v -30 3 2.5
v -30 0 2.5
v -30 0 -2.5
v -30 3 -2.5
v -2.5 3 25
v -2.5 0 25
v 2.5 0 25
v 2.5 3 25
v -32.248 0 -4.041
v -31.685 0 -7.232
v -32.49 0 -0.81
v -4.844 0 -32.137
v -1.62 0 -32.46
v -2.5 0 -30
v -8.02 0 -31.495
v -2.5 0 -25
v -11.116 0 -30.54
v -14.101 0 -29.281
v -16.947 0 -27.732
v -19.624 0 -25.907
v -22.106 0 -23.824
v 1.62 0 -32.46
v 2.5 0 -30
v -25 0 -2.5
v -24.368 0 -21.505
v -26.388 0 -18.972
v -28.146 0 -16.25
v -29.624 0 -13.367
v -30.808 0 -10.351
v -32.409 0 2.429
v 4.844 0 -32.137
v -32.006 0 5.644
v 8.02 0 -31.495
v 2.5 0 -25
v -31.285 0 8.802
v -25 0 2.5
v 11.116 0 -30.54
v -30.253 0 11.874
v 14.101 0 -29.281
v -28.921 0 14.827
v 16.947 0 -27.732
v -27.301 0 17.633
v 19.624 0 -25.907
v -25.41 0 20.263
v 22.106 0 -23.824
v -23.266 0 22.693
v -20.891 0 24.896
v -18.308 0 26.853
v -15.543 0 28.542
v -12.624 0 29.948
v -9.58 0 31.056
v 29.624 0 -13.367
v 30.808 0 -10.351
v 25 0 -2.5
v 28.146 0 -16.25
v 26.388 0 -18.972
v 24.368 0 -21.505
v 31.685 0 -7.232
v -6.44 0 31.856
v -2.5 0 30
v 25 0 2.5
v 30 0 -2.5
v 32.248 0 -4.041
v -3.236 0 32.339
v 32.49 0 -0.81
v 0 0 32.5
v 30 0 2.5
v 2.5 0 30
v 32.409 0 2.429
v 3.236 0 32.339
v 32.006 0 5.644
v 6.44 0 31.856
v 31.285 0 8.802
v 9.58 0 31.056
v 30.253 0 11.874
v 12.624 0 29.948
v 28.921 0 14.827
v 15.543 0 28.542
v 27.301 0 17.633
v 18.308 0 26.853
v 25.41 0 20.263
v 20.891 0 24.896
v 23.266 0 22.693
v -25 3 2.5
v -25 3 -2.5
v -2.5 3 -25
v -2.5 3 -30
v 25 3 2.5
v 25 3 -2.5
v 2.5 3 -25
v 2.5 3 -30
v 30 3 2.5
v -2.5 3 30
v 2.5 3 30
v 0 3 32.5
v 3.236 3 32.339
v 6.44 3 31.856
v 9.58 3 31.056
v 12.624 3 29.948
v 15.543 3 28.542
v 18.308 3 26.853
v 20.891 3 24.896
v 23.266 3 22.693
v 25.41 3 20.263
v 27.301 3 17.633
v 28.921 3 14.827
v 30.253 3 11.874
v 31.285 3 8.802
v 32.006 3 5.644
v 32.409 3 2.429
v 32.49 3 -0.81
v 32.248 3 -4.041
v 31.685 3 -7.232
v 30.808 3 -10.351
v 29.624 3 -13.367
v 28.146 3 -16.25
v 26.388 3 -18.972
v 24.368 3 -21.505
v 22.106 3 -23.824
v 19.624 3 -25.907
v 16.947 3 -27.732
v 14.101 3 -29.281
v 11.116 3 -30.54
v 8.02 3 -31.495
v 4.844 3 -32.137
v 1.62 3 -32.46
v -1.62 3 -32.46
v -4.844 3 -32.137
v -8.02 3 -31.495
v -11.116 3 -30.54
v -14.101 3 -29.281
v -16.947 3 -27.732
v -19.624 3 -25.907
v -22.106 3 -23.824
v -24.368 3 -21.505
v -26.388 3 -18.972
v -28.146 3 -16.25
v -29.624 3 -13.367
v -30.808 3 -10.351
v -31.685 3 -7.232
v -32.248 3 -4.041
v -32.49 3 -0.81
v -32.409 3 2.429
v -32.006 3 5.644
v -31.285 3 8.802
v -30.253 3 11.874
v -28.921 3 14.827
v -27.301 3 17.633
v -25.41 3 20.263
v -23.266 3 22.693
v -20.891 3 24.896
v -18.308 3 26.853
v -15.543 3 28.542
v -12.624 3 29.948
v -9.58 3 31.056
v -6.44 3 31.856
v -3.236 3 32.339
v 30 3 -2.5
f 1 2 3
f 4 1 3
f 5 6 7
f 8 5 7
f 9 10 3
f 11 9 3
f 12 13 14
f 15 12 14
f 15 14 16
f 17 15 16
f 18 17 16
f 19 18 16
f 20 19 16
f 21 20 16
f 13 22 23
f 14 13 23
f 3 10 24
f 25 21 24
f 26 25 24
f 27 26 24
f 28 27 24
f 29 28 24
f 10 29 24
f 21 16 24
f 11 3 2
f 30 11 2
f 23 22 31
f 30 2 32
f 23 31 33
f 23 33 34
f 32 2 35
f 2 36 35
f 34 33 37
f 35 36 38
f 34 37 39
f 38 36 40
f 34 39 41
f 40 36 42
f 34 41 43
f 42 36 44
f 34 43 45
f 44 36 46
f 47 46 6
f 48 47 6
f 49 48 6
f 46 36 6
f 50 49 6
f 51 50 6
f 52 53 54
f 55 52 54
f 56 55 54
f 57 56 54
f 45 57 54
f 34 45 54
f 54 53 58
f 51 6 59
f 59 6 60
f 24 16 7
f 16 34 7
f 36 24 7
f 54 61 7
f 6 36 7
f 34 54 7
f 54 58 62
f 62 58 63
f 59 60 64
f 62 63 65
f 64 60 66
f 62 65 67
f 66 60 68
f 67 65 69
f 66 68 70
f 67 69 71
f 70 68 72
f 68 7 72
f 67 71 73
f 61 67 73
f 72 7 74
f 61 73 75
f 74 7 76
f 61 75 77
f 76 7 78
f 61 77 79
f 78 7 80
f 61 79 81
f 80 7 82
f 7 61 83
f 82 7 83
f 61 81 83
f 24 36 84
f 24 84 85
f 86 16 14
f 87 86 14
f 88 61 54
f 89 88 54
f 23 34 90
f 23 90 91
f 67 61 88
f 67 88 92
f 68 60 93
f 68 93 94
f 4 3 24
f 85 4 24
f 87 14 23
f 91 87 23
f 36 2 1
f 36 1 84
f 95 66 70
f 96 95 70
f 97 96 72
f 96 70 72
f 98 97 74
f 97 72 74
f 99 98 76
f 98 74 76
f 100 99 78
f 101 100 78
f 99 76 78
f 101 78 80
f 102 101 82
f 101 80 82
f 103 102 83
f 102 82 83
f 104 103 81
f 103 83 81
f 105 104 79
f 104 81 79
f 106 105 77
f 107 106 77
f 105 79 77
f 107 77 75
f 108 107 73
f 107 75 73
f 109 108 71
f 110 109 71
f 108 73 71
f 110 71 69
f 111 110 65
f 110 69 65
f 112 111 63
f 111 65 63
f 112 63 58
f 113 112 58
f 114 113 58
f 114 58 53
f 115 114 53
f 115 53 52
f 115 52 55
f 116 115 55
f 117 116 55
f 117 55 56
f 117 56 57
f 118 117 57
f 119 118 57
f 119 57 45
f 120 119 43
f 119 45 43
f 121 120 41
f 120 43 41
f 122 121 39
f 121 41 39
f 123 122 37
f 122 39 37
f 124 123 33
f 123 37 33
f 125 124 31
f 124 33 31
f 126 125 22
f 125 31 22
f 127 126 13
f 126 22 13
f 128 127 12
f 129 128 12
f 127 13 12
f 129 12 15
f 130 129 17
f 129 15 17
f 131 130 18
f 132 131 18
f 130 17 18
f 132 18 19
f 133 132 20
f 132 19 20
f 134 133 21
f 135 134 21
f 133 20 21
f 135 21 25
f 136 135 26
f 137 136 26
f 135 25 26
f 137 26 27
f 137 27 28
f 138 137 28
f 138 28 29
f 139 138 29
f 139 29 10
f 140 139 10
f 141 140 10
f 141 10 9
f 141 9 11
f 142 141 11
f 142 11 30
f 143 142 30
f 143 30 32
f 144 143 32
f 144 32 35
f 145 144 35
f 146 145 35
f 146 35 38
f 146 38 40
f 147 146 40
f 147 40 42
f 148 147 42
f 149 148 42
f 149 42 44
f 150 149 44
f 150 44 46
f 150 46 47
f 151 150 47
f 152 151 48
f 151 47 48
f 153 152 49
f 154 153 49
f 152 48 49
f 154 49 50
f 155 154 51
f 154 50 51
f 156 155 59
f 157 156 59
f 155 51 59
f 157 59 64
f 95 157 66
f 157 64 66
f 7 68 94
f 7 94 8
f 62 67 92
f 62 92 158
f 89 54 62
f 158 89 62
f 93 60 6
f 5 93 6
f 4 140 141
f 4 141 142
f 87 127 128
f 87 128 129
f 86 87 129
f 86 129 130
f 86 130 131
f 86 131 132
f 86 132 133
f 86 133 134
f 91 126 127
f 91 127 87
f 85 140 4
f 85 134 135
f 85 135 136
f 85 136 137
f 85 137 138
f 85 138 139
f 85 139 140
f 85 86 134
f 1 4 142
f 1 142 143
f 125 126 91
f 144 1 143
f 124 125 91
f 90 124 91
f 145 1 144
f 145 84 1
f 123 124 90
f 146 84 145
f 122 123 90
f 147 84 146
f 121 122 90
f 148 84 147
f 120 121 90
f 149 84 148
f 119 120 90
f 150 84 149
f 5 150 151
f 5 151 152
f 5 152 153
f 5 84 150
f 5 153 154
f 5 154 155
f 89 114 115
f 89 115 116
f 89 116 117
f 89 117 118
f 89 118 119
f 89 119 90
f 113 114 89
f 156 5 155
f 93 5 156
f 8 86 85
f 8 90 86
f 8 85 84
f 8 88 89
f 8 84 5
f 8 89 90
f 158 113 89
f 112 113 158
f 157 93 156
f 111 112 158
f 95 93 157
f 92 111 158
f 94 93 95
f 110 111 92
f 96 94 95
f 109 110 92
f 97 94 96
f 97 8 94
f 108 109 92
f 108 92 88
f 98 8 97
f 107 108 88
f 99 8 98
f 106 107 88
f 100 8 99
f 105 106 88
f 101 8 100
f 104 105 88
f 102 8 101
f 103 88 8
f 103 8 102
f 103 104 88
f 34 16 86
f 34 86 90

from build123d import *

# Parameters (mm, degrees)
SKETCH1_R               = 32.5
BOSS_EXTRUDE1_DEPTH     = 3
CUT_EXTRUDE1_DEPTH      = 10
CUT_EXTRUDE1_DEPTH_BACK = 47.059743812
SKETCH2_W               = 5
SKETCH2_H               = 5


with BuildPart() as part:
    # Sketch1 → Boss-Extrude1 (new body)
    with BuildSketch(Plane(origin=(0, 0, 0), x_dir=(1, 0, 0), z_dir=(0, 1, 0))):
        with Locations(Location((0, 0, 0), (0, 0, 270))):
            Circle(SKETCH1_R)
    extrude(amount=BOSS_EXTRUDE1_DEPTH)

    # Sketch2 → Cut-Extrude1 (cut, two sides: drawn at the far end of the back side and taken through both)
    with BuildSketch(Plane(origin=(0, 0, 0), x_dir=(1, 0, 0), z_dir=(0, 1, 0)).offset(-CUT_EXTRUDE1_DEPTH_BACK)):
        with Locations((0, -27.5)):
            Rectangle(SKETCH2_W, SKETCH2_H)
        with Locations((27.5, 0)):
            Rectangle(SKETCH2_W, SKETCH2_H)
        with Locations((-27.5, 0)):
            Rectangle(SKETCH2_W, SKETCH2_H)
        with Locations((0, 27.5)):
            Rectangle(SKETCH2_W, SKETCH2_H)
    extrude(amount=CUT_EXTRUDE1_DEPTH + CUT_EXTRUDE1_DEPTH_BACK, mode=Mode.SUBTRACT)


solid = part.part
